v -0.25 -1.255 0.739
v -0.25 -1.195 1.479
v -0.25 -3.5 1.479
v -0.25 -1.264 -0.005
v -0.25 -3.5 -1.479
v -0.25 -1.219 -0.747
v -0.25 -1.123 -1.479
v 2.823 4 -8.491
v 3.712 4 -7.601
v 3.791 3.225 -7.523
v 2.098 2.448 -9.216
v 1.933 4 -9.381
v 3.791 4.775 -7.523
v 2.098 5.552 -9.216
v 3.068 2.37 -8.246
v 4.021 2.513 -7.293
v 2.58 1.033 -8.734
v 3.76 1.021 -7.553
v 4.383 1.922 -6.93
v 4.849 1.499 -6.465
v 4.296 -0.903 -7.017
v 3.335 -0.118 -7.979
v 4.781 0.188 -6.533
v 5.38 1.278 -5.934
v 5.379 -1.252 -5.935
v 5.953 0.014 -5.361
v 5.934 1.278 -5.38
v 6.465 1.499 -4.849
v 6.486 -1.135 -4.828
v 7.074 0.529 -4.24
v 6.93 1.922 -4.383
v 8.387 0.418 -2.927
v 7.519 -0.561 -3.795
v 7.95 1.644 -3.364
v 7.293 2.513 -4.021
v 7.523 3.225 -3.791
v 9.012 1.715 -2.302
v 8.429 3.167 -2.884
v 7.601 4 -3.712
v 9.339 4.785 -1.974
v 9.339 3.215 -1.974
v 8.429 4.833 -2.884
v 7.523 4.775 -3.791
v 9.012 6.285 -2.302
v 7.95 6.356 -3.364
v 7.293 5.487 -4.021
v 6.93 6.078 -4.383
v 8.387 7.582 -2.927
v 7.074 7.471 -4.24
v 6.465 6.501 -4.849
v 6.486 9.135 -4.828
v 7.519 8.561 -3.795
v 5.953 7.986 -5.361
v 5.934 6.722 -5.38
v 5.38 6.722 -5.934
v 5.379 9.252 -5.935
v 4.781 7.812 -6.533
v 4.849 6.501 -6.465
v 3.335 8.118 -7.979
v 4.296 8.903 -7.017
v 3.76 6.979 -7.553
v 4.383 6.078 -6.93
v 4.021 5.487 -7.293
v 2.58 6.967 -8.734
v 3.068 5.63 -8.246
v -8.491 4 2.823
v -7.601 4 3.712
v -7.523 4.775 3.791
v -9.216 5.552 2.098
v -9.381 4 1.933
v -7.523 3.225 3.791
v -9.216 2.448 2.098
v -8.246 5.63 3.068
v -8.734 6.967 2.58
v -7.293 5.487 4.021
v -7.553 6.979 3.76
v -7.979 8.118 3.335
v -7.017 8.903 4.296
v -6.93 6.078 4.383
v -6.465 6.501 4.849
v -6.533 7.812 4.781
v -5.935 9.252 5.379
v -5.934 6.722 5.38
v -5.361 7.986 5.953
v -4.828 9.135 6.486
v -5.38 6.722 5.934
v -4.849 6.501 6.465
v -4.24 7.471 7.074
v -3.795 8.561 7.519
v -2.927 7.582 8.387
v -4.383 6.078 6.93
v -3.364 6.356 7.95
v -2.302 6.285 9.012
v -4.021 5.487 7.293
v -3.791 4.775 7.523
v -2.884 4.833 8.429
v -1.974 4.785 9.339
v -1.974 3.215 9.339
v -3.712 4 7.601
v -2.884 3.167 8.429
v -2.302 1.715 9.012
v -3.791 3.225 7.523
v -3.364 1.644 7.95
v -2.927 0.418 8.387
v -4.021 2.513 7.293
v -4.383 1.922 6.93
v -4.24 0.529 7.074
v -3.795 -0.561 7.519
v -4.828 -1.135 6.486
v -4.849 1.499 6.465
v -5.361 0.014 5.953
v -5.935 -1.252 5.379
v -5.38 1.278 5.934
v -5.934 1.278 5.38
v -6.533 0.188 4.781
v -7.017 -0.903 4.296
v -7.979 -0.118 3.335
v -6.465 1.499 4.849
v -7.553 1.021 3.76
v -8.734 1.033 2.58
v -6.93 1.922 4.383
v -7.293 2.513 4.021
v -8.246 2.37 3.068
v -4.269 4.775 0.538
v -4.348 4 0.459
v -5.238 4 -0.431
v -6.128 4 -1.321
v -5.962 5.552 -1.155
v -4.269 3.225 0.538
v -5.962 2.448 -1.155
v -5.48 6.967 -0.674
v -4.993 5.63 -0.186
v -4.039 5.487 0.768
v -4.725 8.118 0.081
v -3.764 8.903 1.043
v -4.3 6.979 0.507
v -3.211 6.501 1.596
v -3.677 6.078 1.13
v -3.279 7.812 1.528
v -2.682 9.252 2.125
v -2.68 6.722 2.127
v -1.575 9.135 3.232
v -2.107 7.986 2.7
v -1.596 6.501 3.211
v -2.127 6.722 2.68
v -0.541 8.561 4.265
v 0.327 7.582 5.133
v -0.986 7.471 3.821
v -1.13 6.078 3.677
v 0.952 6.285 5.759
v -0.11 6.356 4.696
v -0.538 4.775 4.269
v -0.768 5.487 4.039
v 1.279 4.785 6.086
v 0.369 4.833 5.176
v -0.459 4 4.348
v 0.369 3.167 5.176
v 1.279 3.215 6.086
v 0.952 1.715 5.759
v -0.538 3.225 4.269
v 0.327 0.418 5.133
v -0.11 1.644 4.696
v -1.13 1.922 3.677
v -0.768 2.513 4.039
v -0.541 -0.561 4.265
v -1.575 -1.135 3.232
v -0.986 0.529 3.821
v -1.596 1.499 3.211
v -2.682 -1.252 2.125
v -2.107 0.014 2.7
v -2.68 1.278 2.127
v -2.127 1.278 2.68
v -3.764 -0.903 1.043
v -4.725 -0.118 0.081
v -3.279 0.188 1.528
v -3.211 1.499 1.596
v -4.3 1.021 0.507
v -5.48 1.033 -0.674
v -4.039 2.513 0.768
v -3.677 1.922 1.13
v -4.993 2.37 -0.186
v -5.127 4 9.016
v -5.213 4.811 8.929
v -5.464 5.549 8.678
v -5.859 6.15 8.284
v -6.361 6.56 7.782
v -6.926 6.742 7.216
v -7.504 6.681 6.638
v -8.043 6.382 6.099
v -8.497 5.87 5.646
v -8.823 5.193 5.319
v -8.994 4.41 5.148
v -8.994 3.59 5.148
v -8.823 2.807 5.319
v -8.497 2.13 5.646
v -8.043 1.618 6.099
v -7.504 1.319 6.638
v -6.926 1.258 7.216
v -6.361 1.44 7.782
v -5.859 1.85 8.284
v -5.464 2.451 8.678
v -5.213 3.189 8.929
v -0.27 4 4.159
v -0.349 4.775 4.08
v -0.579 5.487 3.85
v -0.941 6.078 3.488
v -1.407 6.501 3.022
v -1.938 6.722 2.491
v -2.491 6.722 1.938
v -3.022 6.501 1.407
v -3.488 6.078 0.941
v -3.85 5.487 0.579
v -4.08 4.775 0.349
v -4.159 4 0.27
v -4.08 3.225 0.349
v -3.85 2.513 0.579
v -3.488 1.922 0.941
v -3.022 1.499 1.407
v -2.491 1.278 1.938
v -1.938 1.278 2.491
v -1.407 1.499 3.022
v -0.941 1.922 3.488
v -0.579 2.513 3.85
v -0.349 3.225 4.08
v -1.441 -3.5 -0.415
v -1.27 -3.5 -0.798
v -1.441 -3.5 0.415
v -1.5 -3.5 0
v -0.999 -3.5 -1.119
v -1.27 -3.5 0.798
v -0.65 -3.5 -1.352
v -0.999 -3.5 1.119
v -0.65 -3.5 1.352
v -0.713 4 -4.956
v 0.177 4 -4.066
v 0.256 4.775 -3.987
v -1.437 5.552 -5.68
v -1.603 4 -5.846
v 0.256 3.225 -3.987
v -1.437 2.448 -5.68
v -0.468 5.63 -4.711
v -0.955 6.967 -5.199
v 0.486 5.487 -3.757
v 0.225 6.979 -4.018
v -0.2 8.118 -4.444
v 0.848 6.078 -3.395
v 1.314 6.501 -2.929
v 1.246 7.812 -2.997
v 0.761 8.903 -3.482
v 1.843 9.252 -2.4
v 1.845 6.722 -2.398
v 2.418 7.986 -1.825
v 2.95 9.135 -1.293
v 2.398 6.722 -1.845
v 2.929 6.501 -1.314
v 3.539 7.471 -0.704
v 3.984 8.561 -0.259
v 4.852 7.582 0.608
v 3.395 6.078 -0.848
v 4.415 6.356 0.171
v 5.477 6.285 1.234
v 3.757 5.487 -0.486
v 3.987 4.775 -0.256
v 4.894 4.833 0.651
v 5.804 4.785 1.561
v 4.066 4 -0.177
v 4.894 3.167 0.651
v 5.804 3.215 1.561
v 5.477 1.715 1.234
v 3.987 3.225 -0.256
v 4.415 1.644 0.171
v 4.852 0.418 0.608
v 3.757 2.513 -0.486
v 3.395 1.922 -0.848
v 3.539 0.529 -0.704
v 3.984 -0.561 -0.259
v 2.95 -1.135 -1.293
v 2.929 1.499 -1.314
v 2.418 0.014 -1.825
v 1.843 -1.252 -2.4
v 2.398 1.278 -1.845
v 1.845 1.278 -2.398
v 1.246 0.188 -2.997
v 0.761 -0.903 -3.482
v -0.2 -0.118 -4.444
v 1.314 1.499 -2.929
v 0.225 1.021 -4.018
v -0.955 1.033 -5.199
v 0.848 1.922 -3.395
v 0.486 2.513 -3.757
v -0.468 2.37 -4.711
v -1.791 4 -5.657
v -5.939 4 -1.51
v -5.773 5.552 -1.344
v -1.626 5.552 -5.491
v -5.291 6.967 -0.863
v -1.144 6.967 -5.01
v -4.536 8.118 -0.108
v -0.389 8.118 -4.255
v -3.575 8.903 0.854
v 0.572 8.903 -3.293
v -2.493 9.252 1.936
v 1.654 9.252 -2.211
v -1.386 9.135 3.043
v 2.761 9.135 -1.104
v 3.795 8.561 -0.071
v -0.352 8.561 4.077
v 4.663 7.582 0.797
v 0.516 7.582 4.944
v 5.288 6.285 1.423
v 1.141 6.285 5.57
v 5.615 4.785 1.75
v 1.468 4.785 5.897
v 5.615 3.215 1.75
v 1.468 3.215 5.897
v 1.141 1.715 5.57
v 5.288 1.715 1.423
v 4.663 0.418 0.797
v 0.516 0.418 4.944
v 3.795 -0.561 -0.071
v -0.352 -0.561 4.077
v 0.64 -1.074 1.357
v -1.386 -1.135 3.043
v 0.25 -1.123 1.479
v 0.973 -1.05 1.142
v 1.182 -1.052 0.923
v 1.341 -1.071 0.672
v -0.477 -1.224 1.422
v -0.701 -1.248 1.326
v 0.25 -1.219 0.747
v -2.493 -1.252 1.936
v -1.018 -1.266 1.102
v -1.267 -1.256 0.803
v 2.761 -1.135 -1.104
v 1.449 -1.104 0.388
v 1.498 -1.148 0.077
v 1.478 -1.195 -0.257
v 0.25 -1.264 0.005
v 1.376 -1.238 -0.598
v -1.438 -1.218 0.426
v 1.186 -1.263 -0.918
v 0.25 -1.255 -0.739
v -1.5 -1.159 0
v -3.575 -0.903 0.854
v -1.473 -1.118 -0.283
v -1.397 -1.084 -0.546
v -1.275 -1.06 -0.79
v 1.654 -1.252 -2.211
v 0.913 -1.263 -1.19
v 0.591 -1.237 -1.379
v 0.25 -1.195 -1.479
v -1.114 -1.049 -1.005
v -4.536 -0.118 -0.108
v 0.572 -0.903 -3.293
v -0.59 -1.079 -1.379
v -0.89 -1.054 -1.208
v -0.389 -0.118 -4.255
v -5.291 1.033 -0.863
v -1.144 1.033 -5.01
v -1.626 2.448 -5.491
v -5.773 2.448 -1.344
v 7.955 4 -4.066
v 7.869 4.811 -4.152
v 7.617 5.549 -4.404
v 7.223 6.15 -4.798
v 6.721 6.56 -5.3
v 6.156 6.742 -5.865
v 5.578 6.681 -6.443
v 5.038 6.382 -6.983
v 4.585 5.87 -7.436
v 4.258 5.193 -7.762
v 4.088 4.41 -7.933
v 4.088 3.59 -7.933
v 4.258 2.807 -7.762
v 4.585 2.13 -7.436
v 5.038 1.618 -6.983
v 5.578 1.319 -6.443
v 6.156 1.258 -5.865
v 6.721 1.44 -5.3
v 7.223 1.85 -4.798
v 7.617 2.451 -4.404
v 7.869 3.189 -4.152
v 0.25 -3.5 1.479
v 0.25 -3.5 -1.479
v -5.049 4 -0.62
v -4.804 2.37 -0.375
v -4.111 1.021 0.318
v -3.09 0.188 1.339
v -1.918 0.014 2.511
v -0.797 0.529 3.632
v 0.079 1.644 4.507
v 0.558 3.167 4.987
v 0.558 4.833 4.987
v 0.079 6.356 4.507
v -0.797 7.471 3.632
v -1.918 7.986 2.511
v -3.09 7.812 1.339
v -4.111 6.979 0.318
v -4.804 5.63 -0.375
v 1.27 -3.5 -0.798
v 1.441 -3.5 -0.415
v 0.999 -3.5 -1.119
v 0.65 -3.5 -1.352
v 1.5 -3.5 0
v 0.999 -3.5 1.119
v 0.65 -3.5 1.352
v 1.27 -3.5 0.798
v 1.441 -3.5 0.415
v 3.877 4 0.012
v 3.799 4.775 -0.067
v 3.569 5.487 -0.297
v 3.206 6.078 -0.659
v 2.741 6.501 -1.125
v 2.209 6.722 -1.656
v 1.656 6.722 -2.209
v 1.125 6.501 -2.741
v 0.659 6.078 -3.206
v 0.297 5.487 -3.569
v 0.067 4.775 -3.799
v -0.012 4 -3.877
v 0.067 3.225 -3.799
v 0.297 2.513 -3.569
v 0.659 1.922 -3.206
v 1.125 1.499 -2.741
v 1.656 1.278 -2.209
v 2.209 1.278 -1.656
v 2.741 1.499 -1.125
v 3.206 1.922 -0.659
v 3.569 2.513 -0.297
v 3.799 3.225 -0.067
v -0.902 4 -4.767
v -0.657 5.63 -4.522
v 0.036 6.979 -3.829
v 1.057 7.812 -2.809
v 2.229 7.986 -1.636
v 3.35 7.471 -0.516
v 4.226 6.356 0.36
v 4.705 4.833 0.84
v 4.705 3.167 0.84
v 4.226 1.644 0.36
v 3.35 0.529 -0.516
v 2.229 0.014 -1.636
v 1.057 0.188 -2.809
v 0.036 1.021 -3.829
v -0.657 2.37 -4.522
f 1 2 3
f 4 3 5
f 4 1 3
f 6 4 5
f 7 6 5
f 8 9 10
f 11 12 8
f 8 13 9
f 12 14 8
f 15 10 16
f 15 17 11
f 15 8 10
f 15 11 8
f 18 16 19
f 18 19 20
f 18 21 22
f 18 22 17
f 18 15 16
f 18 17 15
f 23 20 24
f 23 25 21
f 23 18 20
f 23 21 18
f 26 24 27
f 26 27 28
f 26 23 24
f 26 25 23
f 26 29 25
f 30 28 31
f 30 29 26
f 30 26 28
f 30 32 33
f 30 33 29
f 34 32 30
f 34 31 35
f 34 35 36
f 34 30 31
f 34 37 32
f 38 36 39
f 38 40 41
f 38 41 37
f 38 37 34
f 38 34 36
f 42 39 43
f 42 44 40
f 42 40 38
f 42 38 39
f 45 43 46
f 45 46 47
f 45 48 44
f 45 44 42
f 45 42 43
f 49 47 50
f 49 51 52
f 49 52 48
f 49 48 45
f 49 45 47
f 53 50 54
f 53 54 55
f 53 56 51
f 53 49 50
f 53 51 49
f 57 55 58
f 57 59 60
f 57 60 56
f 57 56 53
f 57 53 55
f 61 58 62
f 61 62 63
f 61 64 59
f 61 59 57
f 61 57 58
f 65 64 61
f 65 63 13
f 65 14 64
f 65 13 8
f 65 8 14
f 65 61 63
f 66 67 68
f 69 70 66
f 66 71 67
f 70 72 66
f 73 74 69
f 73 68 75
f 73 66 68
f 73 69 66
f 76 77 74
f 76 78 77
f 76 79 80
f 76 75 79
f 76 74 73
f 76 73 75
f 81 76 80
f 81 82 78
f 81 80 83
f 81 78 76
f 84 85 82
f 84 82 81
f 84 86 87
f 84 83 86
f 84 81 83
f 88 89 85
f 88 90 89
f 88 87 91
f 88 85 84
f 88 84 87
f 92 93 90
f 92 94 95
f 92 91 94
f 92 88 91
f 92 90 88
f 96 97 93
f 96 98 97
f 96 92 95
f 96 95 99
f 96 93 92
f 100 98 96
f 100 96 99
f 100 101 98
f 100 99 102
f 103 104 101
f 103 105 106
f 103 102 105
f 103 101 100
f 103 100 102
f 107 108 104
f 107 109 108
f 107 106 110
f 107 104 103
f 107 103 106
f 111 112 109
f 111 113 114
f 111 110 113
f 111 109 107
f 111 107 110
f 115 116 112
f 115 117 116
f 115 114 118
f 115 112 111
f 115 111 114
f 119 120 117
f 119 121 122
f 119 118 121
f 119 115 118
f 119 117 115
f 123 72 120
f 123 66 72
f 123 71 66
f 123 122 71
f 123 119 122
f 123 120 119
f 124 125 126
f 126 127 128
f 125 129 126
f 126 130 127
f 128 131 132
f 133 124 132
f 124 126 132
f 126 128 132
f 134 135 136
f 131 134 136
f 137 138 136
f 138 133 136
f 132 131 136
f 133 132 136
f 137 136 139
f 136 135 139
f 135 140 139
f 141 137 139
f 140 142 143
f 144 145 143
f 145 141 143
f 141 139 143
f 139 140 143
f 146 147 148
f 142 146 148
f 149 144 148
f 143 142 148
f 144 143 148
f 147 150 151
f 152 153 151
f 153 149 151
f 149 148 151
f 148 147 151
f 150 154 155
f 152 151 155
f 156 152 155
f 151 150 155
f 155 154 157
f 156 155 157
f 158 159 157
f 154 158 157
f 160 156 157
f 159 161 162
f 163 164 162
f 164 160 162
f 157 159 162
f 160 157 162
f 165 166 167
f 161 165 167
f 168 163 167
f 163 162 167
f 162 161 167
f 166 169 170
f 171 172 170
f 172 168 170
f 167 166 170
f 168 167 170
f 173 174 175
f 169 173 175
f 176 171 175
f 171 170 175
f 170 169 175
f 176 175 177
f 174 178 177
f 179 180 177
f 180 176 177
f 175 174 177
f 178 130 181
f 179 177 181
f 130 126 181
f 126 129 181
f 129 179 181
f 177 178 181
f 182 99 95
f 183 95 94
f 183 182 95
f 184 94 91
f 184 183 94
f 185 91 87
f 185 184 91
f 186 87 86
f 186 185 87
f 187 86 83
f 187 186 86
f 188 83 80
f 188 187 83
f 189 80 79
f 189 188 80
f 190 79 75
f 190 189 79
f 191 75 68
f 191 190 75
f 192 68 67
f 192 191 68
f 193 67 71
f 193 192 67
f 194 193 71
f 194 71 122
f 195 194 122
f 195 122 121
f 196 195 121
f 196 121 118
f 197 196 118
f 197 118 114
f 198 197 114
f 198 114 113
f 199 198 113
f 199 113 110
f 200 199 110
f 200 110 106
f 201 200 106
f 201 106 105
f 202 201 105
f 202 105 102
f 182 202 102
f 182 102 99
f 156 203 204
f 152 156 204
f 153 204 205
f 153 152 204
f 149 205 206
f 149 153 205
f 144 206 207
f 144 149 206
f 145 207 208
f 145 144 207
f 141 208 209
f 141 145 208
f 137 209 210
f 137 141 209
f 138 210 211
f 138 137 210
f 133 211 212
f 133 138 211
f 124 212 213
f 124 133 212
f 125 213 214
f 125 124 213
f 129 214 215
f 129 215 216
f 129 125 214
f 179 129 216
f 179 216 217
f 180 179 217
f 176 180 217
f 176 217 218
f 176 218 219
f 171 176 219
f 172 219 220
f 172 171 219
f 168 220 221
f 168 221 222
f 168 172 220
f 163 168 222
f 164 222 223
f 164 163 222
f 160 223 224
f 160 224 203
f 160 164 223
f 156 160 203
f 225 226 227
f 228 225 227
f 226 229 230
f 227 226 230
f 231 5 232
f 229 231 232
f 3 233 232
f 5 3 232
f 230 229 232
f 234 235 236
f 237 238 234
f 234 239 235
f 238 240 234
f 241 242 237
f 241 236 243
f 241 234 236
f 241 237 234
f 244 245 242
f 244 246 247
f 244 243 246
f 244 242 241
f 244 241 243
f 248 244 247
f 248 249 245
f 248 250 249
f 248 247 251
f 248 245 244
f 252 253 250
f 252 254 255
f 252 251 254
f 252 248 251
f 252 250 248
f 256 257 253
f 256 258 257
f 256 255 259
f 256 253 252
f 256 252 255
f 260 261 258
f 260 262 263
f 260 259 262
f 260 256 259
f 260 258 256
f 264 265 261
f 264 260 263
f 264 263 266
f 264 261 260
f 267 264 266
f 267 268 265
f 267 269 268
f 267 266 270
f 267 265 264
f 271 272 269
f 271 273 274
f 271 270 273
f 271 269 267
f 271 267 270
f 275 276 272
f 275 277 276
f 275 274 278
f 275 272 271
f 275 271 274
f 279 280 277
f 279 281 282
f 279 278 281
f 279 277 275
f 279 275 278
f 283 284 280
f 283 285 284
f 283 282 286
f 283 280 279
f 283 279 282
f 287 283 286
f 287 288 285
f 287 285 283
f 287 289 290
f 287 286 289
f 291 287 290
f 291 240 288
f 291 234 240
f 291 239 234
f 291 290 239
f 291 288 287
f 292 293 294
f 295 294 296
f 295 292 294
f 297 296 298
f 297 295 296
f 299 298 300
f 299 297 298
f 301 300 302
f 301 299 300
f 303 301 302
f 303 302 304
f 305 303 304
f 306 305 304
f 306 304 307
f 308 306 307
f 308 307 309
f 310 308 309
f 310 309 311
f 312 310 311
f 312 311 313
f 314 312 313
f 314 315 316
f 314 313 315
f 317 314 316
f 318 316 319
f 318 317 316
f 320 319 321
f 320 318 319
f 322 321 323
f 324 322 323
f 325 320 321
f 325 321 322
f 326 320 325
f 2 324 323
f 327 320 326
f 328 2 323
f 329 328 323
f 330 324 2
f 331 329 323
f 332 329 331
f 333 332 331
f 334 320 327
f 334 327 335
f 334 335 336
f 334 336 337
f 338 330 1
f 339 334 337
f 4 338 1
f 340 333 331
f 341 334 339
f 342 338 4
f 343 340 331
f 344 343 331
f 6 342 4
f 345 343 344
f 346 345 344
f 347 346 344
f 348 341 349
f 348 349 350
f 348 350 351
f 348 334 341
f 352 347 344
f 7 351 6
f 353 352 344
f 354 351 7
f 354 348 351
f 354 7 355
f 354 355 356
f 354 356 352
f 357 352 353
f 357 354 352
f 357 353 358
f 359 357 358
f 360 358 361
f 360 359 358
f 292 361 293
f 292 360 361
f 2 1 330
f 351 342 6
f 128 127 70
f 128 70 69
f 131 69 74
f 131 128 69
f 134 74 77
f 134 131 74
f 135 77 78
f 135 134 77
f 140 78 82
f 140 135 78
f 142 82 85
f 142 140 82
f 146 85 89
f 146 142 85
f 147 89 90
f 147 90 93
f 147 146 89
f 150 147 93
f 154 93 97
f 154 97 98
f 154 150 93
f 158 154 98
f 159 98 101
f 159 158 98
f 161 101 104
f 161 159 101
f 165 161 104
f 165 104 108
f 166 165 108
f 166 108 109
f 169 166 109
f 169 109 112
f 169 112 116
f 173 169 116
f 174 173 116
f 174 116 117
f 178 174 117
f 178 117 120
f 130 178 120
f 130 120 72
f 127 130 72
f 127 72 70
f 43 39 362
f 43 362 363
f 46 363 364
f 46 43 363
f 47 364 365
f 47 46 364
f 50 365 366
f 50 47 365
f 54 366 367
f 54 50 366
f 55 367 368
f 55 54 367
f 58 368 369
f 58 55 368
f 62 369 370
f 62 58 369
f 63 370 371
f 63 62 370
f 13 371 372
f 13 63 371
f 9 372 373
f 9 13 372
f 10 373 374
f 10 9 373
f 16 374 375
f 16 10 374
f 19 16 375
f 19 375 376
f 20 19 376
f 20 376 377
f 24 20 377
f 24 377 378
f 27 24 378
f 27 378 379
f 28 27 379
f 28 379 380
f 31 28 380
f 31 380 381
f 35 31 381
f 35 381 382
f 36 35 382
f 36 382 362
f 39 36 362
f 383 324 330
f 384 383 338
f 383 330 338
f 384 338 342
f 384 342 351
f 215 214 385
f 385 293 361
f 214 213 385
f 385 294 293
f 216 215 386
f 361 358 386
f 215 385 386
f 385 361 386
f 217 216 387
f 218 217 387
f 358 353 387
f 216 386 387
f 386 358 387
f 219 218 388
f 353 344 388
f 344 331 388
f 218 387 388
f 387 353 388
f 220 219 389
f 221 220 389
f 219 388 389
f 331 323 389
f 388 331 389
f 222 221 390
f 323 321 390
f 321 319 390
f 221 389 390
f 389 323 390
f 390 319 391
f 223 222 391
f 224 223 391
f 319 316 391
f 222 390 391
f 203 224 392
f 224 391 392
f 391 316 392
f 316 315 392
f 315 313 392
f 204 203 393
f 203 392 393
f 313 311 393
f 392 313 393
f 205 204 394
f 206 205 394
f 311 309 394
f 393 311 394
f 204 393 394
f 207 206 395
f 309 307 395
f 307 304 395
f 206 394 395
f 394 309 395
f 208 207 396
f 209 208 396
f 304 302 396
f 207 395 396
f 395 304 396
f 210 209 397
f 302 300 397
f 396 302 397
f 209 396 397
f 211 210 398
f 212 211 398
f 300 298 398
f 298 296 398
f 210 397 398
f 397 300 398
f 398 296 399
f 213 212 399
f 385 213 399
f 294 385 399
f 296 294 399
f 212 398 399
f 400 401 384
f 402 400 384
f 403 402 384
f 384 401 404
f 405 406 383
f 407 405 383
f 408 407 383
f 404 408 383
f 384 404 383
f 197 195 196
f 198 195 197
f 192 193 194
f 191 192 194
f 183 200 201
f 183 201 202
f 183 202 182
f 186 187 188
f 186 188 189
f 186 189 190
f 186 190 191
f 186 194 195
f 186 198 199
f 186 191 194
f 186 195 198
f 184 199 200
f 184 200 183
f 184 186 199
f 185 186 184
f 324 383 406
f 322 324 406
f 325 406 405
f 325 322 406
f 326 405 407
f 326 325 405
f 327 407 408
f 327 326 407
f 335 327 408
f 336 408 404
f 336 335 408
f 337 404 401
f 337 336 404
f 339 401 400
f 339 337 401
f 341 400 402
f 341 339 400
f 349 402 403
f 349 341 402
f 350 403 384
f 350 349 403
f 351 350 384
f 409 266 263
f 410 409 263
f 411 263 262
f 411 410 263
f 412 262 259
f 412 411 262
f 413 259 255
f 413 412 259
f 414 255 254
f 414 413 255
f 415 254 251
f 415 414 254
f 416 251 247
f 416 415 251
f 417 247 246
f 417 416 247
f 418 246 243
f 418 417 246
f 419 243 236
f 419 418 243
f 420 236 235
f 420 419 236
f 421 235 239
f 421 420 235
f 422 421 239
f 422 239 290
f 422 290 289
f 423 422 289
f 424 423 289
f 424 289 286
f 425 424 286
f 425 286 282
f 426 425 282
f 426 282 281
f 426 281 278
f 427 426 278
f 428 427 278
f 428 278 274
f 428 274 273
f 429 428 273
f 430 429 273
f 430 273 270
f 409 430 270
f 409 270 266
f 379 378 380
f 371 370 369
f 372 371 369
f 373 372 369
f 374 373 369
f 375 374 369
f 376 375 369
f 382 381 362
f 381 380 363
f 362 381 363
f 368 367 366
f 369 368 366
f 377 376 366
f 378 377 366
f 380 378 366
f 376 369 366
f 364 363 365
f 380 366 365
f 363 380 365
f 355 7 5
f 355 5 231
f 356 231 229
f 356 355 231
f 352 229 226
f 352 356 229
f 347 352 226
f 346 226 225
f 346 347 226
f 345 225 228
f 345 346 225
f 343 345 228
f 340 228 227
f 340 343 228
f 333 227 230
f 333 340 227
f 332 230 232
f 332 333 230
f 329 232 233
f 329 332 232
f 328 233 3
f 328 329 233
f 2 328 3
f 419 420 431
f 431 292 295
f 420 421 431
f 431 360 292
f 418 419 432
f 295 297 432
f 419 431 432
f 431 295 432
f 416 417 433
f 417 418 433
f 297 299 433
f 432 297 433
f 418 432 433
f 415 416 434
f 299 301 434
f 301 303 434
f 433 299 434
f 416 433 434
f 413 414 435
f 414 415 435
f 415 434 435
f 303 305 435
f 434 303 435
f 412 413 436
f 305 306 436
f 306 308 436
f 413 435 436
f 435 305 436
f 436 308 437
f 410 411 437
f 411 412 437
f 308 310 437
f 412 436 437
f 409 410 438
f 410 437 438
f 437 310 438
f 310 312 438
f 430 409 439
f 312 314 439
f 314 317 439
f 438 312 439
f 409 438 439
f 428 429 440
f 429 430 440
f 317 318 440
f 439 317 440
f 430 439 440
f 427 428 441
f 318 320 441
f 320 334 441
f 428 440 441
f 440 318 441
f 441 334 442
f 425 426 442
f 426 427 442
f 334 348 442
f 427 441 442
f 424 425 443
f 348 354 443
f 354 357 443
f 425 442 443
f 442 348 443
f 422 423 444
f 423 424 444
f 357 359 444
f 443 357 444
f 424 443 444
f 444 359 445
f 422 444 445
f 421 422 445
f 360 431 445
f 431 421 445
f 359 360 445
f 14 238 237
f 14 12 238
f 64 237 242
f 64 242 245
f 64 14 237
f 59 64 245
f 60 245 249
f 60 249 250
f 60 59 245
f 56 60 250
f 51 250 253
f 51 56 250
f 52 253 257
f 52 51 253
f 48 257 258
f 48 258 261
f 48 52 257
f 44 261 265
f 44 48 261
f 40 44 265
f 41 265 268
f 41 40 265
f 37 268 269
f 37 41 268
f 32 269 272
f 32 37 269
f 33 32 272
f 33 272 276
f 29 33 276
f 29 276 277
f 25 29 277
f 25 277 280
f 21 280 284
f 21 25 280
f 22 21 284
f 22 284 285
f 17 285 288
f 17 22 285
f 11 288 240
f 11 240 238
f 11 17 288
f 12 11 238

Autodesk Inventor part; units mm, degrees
ref_plane "YZ Plane" through (0, 0, 0) normal (1, 0, 0) x (0, 1, 0)
ref_plane "XZ Plane" through (0, 0, 0) normal (0, 1, 0) x (-1, 0, 0)
ref_plane "XY Plane" through (0, 0, 0) normal (0, 0, 1) x (1, 0, 0)
sketch "Sketch1" plane through (0, 0, 0) normal (0, 1, 0) x (-1, 0, 0)
  circle A0 centre (0, 0) radius 1.5
  line L0 (-0.25, 1.479) -> (-0.25, -1.479)
  line L1 (0.25, 1.479) -> (0.25, -1.479)
  line L2 (0, -7.0882) -> (0, 2.9314) projected
  point P0 (-1.4457, -0.4)
  point P1 (1.4457, -0.4)
  point P2 (1.4967, 0.1)
  point P3 (-1.4967, 0.1)
  dimension "d0" = 3
  dimension "d21" = 0.5
  dimension "d23" = 0.25
extrude "Extrusion1" add sketch "Sketch1" along normal blind 4
extrude "Extrusion2" cut sketch "Sketch1" along normal blind 2.6 contours L1 A0 L2 | L2 A0 L0
sketch "Sketch2" plane through (0, 4, 0) normal (0, 1, 0) x (1, 0, 0)
  line L0 (0, 0) -> (-5.6569, -5.6569)
  line L1 (0, 0) -> (8, 0) construction
  line L2 (0, 0) -> (5.6569, 5.6569)
  line L3 (-5.6569, -5.6569) -> (-9.381, -1.9327)
  line L4 (-9.381, -1.9327) -> (1.9327, 9.381)
  line L5 (1.9327, 9.381) -> (5.6569, 5.6569)
  line L6 (-2.4034, -2.4034) -> (-6.1275, 1.3208)
  line L7 (-2.2144, -2.2144) -> (-5.9386, 1.5097)
  line L8 (-2.2144, -2.2144) -> (1.9327, 1.9327)
  line L9 (1.9327, 1.9327) -> (-1.7914, 5.6569)
  line L10 (1.9327, 1.9327) -> (2.1215, 2.1215)
  line L11 (2.1215, 2.1215) -> (-1.6026, 5.8457)
  dimension "d7" = 8
  dimension "d8" = 135
  dimension "d9" = 8
  dimension "d13" = 0.267
extrude "Extrusion3" add sketch "Sketch1" against normal blind 3.5 contours A0 L1 | L0 A0
revolve "Revolution1" add sketch "Sketch2" angle 360 about axis through (0, 4, 0) along (0.7071, 0, -0.7071)
revolve "Revolution2" cut sketch "Sketch2" angle 360 about axis through (0, 4, 0) along (-0.7071, 0, 0.7071) contours L0 L6 L4 L7
revolve "Revolution3" cut sketch "Sketch2" angle 360 about axis through (0, 4, 0) along (0.7071, 0, -0.7071) contours L9 L4 L11 L2
sketch "Sketch3" plane through (-5.6569, 4, 5.6569) normal (-0.7071, 0, 0.7071) x (0.7071, 0, 0.7071)
  circle A0 centre (0, 0) radius 2.75
  point P0 (0, -4)
  dimension "d16" = 5.5
extrude "Extrusion4" add sketch "Sketch3" along normal blind 2 and the other way blind 16.5
sketch "Sketch5" plane through (0, 0, 0) normal (1, 0, 0) x (0, 1, 0)
  point P0 (0, 0)
sketch "Sketch6" plane through (5.6569, 4, -5.6569) normal (0.7071, 0, -0.7071) x (-0.7071, 0, -0.7071)
  point P0 (0, -4)
properties part number "McCrea_rameno_Walle"
